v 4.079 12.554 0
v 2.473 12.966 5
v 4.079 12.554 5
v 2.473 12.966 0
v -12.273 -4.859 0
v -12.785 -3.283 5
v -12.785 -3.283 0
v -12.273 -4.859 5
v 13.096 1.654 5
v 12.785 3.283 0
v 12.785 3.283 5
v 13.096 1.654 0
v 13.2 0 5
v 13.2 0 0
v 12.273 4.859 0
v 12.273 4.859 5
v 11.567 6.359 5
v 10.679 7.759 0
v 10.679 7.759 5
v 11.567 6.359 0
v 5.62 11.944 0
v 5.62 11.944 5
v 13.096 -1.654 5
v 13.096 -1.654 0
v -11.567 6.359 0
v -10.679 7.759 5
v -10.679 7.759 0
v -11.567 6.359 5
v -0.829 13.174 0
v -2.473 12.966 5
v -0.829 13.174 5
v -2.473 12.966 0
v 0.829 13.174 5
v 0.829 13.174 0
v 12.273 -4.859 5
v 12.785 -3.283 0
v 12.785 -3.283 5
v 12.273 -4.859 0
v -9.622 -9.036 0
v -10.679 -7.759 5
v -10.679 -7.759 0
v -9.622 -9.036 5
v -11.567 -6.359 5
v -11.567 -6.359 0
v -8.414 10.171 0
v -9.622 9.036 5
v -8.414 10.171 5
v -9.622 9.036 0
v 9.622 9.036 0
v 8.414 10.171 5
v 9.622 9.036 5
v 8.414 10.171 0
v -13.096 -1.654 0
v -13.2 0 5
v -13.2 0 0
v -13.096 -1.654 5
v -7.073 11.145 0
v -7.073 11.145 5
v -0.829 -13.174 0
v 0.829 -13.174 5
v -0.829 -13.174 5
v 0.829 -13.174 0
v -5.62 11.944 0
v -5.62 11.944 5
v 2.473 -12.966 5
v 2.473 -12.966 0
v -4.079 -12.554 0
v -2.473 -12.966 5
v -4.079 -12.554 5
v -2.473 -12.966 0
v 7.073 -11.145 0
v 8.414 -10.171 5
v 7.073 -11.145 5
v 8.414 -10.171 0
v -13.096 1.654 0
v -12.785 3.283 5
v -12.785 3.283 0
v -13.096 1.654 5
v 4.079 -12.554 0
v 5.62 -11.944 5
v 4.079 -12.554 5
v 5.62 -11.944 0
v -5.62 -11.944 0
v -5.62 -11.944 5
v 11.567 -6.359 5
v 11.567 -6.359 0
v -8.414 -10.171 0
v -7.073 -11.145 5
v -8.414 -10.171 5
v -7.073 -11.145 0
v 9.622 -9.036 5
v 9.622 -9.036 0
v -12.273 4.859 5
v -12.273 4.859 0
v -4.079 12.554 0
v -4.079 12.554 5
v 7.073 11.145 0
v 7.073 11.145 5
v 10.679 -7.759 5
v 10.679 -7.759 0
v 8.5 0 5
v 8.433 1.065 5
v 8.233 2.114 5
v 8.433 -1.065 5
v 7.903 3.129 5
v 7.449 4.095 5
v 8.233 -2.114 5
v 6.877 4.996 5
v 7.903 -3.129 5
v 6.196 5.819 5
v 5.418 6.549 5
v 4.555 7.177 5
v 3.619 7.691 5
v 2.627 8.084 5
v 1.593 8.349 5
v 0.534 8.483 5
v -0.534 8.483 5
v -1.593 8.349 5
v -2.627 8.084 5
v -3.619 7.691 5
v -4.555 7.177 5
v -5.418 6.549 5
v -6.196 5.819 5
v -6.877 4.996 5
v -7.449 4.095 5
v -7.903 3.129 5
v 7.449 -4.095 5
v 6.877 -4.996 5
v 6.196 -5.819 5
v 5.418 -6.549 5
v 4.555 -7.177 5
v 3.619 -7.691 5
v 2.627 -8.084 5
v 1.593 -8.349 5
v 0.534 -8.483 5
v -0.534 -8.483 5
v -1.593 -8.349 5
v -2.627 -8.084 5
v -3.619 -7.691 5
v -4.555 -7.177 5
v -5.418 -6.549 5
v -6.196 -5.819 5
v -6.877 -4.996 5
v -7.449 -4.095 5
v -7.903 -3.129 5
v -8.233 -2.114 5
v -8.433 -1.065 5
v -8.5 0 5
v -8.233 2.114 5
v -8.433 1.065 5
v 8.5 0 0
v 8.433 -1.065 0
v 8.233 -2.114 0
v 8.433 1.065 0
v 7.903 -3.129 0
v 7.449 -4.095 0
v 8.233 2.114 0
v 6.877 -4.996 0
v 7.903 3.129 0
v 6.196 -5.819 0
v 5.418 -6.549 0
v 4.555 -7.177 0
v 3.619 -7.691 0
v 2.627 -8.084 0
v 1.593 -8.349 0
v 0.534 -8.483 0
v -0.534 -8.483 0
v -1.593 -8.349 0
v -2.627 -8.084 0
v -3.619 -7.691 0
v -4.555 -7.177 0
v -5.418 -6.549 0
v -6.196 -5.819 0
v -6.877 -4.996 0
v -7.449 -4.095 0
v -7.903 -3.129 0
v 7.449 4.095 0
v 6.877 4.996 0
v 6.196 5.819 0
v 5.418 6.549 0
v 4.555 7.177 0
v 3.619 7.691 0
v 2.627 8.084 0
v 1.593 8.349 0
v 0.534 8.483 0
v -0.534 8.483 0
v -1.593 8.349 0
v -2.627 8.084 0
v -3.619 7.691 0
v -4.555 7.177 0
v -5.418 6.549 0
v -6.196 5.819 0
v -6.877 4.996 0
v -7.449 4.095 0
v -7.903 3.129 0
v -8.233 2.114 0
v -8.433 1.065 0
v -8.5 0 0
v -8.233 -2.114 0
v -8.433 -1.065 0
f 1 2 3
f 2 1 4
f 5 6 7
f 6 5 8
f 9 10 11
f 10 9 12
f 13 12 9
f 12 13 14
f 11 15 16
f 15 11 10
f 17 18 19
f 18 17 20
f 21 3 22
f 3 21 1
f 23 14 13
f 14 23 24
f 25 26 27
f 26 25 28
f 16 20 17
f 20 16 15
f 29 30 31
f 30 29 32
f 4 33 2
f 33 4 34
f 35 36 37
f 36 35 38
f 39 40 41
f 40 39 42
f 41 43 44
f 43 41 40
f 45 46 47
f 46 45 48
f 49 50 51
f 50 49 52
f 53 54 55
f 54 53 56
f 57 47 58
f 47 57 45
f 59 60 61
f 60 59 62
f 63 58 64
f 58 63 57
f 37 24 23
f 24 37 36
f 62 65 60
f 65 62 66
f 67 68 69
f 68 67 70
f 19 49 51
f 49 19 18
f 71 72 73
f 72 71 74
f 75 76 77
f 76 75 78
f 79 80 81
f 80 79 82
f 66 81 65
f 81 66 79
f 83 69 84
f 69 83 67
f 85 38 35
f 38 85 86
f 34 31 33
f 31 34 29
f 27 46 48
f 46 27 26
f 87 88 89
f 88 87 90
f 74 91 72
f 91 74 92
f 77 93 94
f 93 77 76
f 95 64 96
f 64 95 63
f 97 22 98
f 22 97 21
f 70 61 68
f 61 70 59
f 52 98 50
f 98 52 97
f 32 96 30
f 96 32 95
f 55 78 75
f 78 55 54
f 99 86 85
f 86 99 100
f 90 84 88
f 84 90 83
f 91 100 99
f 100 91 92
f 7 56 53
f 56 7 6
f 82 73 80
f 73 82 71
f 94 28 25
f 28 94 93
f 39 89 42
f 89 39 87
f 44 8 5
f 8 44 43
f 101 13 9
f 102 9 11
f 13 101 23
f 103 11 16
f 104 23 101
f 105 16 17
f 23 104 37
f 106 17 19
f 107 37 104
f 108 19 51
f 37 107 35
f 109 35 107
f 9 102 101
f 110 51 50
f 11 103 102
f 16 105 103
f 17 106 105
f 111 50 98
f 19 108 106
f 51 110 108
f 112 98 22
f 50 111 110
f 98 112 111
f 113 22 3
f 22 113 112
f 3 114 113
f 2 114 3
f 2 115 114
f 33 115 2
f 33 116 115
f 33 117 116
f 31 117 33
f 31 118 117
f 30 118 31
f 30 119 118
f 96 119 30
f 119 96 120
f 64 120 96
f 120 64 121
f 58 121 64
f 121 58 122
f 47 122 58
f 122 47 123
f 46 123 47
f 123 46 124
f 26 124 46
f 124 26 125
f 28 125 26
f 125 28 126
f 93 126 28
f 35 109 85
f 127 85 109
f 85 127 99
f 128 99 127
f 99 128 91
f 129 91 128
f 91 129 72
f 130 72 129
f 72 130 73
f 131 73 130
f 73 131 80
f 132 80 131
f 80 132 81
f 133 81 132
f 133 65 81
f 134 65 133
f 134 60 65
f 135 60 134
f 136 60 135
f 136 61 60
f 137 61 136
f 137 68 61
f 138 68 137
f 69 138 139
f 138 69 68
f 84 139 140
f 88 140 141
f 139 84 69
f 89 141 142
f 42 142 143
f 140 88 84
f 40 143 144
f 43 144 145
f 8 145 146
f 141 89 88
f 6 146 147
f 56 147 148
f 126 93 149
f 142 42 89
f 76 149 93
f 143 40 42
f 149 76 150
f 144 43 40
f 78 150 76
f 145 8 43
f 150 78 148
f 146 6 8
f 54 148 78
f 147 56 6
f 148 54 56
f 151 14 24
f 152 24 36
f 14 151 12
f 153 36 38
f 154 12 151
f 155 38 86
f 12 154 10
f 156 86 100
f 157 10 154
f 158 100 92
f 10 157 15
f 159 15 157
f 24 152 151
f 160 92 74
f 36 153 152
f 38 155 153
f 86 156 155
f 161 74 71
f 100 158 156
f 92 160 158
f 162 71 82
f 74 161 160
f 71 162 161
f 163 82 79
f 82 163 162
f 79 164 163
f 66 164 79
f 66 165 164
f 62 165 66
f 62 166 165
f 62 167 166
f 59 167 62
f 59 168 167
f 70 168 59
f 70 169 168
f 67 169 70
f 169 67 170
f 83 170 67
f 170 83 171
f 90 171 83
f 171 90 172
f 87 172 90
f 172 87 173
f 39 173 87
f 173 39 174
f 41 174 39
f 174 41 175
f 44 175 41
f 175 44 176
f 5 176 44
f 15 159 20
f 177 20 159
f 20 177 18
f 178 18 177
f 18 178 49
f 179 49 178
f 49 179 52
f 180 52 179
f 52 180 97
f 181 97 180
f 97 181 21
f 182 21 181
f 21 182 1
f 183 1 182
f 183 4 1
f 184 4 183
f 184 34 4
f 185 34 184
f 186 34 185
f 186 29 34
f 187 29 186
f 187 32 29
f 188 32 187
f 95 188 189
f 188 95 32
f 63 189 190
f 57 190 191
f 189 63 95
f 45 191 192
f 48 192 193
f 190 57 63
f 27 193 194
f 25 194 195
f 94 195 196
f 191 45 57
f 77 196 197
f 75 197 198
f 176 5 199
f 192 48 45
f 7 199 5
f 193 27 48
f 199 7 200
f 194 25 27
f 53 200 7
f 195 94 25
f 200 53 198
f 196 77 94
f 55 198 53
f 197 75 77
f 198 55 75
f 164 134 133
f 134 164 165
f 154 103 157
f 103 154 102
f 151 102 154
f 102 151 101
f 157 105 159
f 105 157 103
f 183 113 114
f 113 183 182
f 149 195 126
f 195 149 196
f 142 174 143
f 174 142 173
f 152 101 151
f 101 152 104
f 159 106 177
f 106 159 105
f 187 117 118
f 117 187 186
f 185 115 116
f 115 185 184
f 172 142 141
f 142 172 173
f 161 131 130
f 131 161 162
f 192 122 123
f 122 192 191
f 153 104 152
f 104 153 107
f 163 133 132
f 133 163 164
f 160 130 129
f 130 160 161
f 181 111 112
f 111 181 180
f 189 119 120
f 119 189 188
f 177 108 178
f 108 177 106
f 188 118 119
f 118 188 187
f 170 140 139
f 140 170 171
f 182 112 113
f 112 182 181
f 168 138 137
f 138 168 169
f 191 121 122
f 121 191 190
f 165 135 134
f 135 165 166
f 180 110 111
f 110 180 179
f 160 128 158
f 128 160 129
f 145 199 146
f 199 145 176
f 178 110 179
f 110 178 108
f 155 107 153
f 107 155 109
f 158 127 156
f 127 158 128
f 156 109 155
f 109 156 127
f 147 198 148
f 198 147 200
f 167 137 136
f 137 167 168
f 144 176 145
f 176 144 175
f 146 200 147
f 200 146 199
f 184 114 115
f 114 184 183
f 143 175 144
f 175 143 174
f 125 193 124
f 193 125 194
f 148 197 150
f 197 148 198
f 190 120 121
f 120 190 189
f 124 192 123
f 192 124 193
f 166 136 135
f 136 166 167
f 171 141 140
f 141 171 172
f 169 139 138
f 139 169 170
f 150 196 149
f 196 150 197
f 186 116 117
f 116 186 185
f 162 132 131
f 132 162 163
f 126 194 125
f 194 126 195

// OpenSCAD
$fn = 50;


difference() {
	union() {
		cylinder(h = 5, r = 13.2000000000);
	}
	union() {
		cylinder(h = 5, r = 8.5000000000);
	}
}
